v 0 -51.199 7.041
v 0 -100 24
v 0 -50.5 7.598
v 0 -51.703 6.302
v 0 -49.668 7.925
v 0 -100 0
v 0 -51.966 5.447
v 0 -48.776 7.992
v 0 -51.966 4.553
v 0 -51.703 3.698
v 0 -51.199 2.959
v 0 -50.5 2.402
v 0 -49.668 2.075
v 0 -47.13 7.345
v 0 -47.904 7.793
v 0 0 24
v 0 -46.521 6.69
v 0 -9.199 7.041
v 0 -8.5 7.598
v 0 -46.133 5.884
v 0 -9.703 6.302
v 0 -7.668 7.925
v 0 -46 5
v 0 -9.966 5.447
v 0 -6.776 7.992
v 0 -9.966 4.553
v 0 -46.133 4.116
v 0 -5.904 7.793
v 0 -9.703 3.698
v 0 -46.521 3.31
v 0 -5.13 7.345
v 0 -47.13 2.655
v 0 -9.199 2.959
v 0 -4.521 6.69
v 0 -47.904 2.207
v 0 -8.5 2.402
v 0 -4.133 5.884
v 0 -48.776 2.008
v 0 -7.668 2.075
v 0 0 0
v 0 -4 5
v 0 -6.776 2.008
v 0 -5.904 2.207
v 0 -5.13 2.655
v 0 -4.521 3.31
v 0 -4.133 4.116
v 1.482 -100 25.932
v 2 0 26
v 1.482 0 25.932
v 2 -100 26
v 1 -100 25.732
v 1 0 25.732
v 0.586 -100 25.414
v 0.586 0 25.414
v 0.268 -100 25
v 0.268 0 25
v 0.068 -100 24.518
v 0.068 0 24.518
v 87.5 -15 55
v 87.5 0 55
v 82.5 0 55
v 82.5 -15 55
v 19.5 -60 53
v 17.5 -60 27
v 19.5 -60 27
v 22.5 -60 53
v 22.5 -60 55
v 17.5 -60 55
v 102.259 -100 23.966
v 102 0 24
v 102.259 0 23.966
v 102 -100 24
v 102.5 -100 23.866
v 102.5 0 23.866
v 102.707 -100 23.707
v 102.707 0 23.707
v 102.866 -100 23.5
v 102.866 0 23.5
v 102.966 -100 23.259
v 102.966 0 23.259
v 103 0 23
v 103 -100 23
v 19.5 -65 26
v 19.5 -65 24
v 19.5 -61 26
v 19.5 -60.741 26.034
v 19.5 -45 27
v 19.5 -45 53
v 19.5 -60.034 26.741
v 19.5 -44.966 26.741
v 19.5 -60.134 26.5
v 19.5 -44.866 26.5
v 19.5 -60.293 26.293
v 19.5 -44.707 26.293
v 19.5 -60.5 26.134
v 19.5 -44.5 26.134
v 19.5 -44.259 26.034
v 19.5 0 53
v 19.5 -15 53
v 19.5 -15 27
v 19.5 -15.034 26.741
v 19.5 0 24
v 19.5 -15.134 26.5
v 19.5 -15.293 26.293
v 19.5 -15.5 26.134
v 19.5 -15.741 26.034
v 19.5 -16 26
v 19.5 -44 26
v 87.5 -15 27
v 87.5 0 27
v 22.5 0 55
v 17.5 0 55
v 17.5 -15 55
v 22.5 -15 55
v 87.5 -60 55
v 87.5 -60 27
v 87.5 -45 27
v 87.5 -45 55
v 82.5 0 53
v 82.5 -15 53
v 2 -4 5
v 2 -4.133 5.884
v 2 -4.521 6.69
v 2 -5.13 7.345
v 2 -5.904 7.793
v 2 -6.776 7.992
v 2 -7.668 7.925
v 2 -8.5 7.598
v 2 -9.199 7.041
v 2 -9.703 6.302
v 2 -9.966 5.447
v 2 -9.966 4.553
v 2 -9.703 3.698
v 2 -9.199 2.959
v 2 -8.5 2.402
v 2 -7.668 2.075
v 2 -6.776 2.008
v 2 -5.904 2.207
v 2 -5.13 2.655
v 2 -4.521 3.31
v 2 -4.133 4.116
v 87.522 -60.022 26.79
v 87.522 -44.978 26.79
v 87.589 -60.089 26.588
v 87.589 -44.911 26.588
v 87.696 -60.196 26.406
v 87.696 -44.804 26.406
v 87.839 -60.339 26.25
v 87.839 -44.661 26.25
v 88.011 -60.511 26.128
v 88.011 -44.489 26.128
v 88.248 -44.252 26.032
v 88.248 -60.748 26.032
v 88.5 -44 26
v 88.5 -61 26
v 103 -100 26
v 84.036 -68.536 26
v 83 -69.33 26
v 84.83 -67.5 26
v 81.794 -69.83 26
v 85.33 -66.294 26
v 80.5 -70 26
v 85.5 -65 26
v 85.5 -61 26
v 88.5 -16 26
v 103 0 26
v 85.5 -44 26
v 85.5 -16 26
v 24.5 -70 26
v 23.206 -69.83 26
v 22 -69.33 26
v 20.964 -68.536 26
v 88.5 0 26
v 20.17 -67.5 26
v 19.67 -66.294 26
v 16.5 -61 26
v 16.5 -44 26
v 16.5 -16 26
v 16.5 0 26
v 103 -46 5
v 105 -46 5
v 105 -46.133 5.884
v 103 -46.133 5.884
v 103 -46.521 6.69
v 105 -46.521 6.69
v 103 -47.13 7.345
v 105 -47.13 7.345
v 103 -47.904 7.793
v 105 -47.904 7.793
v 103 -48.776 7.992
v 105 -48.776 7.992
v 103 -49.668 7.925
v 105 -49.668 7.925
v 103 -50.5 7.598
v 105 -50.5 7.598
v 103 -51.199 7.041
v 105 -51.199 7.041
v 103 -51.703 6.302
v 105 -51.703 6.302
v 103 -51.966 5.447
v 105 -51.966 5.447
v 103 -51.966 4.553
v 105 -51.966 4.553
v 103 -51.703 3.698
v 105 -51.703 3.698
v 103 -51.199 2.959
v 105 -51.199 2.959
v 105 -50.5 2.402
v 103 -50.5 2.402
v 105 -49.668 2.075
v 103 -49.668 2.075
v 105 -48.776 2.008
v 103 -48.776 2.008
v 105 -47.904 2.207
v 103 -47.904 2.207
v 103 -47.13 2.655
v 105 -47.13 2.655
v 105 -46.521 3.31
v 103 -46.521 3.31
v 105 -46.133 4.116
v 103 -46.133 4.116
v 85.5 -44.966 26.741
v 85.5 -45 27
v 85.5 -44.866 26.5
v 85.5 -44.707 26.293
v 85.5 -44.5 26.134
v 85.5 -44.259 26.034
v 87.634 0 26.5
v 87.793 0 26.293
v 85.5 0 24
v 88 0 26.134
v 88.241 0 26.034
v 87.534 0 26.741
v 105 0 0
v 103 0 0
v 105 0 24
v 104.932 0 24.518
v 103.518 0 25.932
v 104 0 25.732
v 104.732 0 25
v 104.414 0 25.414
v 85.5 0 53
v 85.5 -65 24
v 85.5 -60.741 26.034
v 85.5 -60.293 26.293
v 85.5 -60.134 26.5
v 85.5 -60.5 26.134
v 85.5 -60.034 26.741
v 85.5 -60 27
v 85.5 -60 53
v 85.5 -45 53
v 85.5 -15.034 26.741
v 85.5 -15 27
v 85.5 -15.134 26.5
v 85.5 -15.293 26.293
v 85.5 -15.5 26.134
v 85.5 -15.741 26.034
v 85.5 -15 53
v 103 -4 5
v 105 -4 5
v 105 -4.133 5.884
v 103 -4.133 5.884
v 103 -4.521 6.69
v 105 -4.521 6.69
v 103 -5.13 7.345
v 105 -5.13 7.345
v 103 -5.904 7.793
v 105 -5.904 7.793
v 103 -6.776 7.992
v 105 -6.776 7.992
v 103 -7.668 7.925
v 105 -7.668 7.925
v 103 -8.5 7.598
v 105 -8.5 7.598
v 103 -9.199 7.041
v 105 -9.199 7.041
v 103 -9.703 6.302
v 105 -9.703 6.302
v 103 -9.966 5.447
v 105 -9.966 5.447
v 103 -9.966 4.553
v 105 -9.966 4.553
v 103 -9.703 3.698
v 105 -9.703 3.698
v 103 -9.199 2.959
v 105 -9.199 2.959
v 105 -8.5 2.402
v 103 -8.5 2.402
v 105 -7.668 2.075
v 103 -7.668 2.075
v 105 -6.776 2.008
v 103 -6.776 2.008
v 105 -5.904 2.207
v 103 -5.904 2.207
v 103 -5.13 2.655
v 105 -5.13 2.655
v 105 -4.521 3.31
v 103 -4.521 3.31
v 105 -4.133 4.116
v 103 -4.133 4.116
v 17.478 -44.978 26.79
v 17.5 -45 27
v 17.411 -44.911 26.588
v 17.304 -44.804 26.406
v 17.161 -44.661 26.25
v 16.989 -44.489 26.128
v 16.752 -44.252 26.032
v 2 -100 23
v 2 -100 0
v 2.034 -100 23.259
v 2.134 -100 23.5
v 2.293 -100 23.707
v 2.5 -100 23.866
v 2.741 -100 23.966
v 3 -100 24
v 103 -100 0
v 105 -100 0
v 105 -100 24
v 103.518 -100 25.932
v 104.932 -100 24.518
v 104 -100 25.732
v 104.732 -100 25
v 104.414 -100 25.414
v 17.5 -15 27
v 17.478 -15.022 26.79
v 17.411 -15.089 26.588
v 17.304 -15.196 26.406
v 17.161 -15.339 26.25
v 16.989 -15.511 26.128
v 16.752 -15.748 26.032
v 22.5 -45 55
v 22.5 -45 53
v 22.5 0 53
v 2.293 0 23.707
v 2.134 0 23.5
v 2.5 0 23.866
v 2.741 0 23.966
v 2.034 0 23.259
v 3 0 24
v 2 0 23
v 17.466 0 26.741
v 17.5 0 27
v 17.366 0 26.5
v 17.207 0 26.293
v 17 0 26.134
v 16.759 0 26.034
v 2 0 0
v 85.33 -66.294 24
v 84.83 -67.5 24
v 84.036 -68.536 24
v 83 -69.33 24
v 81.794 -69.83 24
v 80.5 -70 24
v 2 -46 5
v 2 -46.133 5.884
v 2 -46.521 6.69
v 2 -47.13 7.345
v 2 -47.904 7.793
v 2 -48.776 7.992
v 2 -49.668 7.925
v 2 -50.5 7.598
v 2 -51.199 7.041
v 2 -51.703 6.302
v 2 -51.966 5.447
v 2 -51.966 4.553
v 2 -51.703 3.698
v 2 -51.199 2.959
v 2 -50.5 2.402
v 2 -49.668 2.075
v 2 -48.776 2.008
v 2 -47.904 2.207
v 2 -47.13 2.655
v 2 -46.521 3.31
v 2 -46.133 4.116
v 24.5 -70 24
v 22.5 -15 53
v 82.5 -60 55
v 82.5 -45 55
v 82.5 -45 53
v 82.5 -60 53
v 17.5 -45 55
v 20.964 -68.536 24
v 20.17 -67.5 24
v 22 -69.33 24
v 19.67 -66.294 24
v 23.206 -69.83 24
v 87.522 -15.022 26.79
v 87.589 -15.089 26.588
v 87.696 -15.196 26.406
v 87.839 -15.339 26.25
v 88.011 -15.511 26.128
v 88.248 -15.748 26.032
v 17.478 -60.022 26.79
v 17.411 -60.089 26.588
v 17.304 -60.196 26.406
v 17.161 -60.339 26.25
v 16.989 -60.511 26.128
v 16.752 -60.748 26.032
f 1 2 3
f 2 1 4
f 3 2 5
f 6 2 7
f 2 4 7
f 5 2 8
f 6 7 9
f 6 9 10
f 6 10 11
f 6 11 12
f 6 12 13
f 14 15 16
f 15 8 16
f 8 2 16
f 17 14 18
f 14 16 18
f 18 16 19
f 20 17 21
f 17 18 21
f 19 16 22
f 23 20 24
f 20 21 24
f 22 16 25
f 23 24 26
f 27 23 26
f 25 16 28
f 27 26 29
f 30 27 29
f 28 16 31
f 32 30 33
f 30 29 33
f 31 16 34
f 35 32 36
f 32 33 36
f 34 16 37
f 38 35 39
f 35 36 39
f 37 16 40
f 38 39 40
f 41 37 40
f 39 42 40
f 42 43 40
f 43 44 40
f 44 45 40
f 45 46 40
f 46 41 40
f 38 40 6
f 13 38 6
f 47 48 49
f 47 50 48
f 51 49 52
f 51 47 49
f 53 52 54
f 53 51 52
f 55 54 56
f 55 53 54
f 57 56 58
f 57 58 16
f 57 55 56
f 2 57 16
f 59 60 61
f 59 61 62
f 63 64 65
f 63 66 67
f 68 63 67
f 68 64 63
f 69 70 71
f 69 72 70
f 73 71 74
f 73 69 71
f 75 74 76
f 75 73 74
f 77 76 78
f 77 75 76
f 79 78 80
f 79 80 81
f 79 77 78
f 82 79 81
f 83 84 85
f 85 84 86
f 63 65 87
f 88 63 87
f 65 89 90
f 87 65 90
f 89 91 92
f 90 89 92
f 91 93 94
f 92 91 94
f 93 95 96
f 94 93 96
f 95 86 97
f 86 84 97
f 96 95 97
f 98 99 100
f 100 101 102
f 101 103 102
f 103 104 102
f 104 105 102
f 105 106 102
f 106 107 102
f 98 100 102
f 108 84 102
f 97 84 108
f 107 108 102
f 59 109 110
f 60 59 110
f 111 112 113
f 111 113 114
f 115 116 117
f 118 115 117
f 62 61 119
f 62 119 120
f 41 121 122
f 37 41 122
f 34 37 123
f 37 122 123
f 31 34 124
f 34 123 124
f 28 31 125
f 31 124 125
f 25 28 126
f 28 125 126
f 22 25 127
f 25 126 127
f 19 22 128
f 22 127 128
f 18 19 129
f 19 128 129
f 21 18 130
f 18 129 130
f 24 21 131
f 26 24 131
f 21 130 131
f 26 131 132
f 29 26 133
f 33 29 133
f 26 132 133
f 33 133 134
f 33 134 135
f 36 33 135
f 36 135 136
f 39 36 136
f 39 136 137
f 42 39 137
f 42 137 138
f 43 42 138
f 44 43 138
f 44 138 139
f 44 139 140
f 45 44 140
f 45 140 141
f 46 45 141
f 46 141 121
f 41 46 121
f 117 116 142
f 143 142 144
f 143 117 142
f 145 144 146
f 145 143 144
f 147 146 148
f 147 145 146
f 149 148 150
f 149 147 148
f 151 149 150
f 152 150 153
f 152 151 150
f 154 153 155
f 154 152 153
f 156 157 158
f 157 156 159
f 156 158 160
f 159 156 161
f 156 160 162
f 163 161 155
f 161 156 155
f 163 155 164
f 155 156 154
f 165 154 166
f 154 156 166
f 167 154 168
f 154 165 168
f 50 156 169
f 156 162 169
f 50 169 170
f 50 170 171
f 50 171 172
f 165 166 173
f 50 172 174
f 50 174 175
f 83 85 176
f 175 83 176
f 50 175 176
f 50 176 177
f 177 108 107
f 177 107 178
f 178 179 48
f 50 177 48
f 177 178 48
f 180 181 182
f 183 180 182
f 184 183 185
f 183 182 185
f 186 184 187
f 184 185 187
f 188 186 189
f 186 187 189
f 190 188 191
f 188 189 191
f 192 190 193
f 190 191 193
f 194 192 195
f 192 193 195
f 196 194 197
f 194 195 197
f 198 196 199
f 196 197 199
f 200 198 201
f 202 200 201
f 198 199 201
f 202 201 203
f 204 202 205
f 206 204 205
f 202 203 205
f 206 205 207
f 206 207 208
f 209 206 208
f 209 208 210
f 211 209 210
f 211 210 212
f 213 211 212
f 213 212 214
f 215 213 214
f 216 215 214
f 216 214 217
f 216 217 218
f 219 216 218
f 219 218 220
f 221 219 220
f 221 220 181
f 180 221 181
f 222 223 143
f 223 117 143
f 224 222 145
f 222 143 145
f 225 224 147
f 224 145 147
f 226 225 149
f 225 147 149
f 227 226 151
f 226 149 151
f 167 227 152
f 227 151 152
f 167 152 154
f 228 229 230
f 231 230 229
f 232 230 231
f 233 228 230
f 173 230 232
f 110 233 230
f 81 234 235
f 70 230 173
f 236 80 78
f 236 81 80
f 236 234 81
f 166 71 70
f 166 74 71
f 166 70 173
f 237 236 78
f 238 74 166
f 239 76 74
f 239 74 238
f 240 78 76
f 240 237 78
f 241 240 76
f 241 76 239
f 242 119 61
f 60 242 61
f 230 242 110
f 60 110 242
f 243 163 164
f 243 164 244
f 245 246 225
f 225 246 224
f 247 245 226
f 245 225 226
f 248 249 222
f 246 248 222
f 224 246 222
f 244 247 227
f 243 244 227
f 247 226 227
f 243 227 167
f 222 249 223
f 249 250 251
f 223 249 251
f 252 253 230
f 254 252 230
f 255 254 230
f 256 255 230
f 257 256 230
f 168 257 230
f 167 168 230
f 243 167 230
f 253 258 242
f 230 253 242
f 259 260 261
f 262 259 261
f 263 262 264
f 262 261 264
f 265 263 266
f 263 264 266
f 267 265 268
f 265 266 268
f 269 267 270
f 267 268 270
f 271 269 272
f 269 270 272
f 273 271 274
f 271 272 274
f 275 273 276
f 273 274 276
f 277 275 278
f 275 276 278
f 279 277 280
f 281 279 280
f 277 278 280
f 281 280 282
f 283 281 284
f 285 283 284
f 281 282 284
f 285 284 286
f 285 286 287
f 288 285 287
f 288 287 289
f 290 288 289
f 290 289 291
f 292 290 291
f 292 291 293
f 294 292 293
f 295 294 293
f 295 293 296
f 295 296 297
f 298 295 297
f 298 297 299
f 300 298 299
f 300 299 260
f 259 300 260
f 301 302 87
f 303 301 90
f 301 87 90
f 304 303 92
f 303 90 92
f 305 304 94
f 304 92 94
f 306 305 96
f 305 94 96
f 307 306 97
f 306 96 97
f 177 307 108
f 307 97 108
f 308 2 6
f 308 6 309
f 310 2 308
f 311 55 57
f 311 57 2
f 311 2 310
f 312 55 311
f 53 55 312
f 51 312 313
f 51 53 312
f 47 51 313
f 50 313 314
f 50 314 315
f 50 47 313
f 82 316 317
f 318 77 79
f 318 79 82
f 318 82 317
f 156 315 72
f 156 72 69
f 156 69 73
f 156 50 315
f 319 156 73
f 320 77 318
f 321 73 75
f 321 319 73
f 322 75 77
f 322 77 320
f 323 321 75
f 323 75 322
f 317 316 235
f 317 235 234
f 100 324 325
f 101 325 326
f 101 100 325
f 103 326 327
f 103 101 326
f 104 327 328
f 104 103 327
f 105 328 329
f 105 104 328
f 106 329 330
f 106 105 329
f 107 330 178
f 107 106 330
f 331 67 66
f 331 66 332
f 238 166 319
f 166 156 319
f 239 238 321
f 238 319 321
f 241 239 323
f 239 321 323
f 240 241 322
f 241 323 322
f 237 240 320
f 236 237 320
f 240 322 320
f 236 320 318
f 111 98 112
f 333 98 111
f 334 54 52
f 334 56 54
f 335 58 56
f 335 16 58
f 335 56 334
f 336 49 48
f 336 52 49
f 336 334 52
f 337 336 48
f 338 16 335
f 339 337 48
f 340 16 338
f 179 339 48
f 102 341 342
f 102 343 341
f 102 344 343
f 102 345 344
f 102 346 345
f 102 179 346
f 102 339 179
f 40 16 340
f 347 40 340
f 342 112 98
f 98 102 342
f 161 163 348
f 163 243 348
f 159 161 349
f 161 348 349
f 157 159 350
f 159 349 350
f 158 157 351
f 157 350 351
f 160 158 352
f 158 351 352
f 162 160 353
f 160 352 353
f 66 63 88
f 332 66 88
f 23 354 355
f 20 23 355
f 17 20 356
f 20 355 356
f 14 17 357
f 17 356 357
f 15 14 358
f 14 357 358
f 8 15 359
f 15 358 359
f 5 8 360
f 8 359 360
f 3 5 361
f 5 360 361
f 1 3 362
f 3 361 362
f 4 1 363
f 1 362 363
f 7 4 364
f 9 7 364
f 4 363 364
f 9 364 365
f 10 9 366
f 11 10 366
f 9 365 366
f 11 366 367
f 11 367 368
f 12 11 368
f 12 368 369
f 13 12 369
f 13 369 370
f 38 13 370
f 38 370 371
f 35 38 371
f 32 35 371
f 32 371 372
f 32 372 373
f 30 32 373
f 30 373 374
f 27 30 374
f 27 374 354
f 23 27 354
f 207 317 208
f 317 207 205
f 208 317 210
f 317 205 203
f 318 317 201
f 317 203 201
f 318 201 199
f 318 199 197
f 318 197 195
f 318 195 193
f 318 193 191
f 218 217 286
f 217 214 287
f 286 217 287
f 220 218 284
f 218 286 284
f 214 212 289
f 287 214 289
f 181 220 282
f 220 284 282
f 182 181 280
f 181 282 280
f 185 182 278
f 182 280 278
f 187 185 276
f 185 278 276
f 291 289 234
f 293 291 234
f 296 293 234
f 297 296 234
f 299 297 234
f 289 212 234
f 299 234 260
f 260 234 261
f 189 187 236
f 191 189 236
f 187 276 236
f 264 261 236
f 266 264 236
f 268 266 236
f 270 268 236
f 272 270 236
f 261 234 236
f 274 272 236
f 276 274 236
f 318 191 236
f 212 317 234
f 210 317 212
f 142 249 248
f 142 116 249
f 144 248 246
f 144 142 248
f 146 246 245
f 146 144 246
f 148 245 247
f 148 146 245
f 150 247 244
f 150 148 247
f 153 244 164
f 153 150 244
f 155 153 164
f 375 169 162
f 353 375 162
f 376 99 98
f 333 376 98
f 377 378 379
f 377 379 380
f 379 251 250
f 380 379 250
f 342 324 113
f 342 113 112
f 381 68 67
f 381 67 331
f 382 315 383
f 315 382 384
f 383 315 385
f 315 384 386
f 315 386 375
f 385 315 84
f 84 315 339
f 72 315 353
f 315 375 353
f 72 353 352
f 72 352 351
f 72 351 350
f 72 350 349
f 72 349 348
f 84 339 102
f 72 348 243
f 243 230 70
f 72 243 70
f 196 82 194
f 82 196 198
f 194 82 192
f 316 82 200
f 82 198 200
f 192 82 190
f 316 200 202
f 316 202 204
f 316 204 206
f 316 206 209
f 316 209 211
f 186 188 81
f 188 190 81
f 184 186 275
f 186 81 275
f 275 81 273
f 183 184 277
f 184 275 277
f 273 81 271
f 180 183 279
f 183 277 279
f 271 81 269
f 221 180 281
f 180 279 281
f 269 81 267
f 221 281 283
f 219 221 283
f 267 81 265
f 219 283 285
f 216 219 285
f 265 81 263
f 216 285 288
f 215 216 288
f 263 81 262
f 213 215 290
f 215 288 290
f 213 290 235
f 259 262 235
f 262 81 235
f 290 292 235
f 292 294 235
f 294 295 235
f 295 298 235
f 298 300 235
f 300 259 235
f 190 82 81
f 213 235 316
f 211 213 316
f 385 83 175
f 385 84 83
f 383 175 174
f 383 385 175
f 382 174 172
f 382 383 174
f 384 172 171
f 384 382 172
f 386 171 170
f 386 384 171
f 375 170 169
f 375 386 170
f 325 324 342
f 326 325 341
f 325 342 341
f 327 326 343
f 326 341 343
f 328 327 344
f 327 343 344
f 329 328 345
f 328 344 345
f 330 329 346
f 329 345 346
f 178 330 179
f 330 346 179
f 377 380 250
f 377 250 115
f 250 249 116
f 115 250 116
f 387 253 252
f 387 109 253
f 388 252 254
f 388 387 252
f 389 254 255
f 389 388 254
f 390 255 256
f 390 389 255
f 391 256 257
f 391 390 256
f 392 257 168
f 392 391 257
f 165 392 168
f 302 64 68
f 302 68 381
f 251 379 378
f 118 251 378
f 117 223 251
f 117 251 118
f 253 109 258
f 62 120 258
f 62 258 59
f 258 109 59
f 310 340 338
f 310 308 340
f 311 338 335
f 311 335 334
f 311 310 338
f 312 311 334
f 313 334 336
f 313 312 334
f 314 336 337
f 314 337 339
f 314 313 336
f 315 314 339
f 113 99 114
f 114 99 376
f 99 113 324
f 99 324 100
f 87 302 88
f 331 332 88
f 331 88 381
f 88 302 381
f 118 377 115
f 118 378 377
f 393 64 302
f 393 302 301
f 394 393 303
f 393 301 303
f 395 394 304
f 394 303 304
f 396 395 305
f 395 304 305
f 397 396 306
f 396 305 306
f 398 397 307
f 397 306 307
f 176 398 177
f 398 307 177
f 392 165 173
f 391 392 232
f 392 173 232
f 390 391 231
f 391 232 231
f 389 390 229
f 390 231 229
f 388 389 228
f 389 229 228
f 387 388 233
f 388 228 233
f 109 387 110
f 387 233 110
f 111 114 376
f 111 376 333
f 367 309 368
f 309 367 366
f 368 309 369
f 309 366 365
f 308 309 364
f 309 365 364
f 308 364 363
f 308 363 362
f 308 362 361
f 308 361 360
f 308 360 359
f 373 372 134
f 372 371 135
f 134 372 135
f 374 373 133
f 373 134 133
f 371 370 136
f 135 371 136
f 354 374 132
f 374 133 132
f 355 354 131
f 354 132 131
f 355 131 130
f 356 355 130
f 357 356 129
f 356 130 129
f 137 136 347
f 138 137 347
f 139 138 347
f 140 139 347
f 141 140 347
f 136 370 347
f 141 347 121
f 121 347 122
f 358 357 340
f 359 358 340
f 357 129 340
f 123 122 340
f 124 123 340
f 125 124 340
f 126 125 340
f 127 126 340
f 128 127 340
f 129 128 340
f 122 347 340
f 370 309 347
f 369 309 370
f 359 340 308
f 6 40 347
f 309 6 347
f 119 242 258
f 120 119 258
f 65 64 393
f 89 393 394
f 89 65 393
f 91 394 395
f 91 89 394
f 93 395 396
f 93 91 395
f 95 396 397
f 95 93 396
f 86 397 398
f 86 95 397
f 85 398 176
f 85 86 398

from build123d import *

# Parameters (mm, degrees)
F1_DEPTH  = 100
F2_R      = 3
F3_DEPTH  = 105.001
F4_W      = 66
F4_H      = 70
F5_DEPTH  = 25
F6_W      = 2
F6_H      = 15
F7_DEPTH  = 29
F8_W      = 15
F8_H      = 2
F9_DEPTH  = 3
F10_W     = 15
F10_H     = 2
F11_DEPTH = 3
F12_R     = 1
F13_R     = 2
F14_R     = 5


with BuildPart() as f1:
    # F0 (on Front) → F1 (new body)
    with BuildSketch(Plane.XZ):
        Polygon((105, 26), (0, 26), (0, 0), (2, 0), (2, 24), (103, 24), (103, 0), (105, 0), align=None)
    extrude(amount=F1_DEPTH)

    # F2 (on face) → F3 (cut, through all)
    with BuildSketch(Plane.YZ.offset(105)):
        with Locations((-7, 5)):
            Circle(F2_R)
        with Locations((-49, 5)):
            Circle(F2_R)
    extrude(amount=-F3_DEPTH, mode=Mode.SUBTRACT)

    # F4 (on face) → F5 (cut)
    with BuildSketch(Plane.XY.offset(26)):
        with Locations((52.5, -35)):
            Rectangle(F4_W, F4_H)
    extrude(amount=-F5_DEPTH, mode=Mode.SUBTRACT)

    # F6 (on face) → F7 (join)
    with BuildSketch(Plane.XY.offset(26)):
        with Locations((18.5, -7.5)):
            Rectangle(F6_W, F6_H)
        with Locations((18.5, -52.5)):
            Rectangle(F6_W, F6_H)
        with Locations((86.5, -7.5)):
            Rectangle(F6_W, F6_H)
        with Locations((86.5, -52.5)):
            Rectangle(F6_W, F6_H)
    extrude(amount=F7_DEPTH)

    # F8 (on face) → F9 (join)
    with BuildSketch(Plane.YZ.offset(19.5)):
        with Locations((-52.5, 54)):
            Rectangle(F8_W, F8_H)
        with Locations((-7.5, 54)):
            Rectangle(F8_W, F8_H)
    extrude(amount=F9_DEPTH)

    # F10 (on face) → F11 (join)
    with BuildSketch(Plane(origin=(85.5, 0, 0), x_dir=(0, -1, 0), z_dir=(-1, 0, 0))):
        with Locations((7.5, 54)):
            Rectangle(F10_W, F10_H)
        with Locations((52.5, 54)):
            Rectangle(F10_W, F10_H)
    extrude(amount=F11_DEPTH)

    # F12
    f12_edges = [f1.edges().sort_by_distance(p)[0] for p in [
        (2, -50, 24),
        (103, -50, 24),
        (17.5, -7.5, 26),
        (18.5, -15, 26),
        (17.5, -52.5, 26),
        (18.5, -60, 26),
        (18.5, -45, 26),
        (86.5, -60, 26),
        (87.5, -52.5, 26),
        (86.5, -15, 26),
        (87.5, -7.5, 26),
        (86.5, -45, 26),
    ]]
    fillet(f12_edges, radius=F12_R)

    # F13
    f13_edges = [f1.edges().sort_by_distance(p)[0] for p in [
        (0, -50, 26),
        (105, -50, 26),
    ]]
    fillet(f13_edges, radius=F13_R)

    # F14
    f14_edges = [f1.edges().sort_by_distance(p)[0] for p in [
        (85.5, -70, 25),
        (19.5, -70, 25),
    ]]
    fillet(f14_edges, radius=F14_R)


solid = f1.part
